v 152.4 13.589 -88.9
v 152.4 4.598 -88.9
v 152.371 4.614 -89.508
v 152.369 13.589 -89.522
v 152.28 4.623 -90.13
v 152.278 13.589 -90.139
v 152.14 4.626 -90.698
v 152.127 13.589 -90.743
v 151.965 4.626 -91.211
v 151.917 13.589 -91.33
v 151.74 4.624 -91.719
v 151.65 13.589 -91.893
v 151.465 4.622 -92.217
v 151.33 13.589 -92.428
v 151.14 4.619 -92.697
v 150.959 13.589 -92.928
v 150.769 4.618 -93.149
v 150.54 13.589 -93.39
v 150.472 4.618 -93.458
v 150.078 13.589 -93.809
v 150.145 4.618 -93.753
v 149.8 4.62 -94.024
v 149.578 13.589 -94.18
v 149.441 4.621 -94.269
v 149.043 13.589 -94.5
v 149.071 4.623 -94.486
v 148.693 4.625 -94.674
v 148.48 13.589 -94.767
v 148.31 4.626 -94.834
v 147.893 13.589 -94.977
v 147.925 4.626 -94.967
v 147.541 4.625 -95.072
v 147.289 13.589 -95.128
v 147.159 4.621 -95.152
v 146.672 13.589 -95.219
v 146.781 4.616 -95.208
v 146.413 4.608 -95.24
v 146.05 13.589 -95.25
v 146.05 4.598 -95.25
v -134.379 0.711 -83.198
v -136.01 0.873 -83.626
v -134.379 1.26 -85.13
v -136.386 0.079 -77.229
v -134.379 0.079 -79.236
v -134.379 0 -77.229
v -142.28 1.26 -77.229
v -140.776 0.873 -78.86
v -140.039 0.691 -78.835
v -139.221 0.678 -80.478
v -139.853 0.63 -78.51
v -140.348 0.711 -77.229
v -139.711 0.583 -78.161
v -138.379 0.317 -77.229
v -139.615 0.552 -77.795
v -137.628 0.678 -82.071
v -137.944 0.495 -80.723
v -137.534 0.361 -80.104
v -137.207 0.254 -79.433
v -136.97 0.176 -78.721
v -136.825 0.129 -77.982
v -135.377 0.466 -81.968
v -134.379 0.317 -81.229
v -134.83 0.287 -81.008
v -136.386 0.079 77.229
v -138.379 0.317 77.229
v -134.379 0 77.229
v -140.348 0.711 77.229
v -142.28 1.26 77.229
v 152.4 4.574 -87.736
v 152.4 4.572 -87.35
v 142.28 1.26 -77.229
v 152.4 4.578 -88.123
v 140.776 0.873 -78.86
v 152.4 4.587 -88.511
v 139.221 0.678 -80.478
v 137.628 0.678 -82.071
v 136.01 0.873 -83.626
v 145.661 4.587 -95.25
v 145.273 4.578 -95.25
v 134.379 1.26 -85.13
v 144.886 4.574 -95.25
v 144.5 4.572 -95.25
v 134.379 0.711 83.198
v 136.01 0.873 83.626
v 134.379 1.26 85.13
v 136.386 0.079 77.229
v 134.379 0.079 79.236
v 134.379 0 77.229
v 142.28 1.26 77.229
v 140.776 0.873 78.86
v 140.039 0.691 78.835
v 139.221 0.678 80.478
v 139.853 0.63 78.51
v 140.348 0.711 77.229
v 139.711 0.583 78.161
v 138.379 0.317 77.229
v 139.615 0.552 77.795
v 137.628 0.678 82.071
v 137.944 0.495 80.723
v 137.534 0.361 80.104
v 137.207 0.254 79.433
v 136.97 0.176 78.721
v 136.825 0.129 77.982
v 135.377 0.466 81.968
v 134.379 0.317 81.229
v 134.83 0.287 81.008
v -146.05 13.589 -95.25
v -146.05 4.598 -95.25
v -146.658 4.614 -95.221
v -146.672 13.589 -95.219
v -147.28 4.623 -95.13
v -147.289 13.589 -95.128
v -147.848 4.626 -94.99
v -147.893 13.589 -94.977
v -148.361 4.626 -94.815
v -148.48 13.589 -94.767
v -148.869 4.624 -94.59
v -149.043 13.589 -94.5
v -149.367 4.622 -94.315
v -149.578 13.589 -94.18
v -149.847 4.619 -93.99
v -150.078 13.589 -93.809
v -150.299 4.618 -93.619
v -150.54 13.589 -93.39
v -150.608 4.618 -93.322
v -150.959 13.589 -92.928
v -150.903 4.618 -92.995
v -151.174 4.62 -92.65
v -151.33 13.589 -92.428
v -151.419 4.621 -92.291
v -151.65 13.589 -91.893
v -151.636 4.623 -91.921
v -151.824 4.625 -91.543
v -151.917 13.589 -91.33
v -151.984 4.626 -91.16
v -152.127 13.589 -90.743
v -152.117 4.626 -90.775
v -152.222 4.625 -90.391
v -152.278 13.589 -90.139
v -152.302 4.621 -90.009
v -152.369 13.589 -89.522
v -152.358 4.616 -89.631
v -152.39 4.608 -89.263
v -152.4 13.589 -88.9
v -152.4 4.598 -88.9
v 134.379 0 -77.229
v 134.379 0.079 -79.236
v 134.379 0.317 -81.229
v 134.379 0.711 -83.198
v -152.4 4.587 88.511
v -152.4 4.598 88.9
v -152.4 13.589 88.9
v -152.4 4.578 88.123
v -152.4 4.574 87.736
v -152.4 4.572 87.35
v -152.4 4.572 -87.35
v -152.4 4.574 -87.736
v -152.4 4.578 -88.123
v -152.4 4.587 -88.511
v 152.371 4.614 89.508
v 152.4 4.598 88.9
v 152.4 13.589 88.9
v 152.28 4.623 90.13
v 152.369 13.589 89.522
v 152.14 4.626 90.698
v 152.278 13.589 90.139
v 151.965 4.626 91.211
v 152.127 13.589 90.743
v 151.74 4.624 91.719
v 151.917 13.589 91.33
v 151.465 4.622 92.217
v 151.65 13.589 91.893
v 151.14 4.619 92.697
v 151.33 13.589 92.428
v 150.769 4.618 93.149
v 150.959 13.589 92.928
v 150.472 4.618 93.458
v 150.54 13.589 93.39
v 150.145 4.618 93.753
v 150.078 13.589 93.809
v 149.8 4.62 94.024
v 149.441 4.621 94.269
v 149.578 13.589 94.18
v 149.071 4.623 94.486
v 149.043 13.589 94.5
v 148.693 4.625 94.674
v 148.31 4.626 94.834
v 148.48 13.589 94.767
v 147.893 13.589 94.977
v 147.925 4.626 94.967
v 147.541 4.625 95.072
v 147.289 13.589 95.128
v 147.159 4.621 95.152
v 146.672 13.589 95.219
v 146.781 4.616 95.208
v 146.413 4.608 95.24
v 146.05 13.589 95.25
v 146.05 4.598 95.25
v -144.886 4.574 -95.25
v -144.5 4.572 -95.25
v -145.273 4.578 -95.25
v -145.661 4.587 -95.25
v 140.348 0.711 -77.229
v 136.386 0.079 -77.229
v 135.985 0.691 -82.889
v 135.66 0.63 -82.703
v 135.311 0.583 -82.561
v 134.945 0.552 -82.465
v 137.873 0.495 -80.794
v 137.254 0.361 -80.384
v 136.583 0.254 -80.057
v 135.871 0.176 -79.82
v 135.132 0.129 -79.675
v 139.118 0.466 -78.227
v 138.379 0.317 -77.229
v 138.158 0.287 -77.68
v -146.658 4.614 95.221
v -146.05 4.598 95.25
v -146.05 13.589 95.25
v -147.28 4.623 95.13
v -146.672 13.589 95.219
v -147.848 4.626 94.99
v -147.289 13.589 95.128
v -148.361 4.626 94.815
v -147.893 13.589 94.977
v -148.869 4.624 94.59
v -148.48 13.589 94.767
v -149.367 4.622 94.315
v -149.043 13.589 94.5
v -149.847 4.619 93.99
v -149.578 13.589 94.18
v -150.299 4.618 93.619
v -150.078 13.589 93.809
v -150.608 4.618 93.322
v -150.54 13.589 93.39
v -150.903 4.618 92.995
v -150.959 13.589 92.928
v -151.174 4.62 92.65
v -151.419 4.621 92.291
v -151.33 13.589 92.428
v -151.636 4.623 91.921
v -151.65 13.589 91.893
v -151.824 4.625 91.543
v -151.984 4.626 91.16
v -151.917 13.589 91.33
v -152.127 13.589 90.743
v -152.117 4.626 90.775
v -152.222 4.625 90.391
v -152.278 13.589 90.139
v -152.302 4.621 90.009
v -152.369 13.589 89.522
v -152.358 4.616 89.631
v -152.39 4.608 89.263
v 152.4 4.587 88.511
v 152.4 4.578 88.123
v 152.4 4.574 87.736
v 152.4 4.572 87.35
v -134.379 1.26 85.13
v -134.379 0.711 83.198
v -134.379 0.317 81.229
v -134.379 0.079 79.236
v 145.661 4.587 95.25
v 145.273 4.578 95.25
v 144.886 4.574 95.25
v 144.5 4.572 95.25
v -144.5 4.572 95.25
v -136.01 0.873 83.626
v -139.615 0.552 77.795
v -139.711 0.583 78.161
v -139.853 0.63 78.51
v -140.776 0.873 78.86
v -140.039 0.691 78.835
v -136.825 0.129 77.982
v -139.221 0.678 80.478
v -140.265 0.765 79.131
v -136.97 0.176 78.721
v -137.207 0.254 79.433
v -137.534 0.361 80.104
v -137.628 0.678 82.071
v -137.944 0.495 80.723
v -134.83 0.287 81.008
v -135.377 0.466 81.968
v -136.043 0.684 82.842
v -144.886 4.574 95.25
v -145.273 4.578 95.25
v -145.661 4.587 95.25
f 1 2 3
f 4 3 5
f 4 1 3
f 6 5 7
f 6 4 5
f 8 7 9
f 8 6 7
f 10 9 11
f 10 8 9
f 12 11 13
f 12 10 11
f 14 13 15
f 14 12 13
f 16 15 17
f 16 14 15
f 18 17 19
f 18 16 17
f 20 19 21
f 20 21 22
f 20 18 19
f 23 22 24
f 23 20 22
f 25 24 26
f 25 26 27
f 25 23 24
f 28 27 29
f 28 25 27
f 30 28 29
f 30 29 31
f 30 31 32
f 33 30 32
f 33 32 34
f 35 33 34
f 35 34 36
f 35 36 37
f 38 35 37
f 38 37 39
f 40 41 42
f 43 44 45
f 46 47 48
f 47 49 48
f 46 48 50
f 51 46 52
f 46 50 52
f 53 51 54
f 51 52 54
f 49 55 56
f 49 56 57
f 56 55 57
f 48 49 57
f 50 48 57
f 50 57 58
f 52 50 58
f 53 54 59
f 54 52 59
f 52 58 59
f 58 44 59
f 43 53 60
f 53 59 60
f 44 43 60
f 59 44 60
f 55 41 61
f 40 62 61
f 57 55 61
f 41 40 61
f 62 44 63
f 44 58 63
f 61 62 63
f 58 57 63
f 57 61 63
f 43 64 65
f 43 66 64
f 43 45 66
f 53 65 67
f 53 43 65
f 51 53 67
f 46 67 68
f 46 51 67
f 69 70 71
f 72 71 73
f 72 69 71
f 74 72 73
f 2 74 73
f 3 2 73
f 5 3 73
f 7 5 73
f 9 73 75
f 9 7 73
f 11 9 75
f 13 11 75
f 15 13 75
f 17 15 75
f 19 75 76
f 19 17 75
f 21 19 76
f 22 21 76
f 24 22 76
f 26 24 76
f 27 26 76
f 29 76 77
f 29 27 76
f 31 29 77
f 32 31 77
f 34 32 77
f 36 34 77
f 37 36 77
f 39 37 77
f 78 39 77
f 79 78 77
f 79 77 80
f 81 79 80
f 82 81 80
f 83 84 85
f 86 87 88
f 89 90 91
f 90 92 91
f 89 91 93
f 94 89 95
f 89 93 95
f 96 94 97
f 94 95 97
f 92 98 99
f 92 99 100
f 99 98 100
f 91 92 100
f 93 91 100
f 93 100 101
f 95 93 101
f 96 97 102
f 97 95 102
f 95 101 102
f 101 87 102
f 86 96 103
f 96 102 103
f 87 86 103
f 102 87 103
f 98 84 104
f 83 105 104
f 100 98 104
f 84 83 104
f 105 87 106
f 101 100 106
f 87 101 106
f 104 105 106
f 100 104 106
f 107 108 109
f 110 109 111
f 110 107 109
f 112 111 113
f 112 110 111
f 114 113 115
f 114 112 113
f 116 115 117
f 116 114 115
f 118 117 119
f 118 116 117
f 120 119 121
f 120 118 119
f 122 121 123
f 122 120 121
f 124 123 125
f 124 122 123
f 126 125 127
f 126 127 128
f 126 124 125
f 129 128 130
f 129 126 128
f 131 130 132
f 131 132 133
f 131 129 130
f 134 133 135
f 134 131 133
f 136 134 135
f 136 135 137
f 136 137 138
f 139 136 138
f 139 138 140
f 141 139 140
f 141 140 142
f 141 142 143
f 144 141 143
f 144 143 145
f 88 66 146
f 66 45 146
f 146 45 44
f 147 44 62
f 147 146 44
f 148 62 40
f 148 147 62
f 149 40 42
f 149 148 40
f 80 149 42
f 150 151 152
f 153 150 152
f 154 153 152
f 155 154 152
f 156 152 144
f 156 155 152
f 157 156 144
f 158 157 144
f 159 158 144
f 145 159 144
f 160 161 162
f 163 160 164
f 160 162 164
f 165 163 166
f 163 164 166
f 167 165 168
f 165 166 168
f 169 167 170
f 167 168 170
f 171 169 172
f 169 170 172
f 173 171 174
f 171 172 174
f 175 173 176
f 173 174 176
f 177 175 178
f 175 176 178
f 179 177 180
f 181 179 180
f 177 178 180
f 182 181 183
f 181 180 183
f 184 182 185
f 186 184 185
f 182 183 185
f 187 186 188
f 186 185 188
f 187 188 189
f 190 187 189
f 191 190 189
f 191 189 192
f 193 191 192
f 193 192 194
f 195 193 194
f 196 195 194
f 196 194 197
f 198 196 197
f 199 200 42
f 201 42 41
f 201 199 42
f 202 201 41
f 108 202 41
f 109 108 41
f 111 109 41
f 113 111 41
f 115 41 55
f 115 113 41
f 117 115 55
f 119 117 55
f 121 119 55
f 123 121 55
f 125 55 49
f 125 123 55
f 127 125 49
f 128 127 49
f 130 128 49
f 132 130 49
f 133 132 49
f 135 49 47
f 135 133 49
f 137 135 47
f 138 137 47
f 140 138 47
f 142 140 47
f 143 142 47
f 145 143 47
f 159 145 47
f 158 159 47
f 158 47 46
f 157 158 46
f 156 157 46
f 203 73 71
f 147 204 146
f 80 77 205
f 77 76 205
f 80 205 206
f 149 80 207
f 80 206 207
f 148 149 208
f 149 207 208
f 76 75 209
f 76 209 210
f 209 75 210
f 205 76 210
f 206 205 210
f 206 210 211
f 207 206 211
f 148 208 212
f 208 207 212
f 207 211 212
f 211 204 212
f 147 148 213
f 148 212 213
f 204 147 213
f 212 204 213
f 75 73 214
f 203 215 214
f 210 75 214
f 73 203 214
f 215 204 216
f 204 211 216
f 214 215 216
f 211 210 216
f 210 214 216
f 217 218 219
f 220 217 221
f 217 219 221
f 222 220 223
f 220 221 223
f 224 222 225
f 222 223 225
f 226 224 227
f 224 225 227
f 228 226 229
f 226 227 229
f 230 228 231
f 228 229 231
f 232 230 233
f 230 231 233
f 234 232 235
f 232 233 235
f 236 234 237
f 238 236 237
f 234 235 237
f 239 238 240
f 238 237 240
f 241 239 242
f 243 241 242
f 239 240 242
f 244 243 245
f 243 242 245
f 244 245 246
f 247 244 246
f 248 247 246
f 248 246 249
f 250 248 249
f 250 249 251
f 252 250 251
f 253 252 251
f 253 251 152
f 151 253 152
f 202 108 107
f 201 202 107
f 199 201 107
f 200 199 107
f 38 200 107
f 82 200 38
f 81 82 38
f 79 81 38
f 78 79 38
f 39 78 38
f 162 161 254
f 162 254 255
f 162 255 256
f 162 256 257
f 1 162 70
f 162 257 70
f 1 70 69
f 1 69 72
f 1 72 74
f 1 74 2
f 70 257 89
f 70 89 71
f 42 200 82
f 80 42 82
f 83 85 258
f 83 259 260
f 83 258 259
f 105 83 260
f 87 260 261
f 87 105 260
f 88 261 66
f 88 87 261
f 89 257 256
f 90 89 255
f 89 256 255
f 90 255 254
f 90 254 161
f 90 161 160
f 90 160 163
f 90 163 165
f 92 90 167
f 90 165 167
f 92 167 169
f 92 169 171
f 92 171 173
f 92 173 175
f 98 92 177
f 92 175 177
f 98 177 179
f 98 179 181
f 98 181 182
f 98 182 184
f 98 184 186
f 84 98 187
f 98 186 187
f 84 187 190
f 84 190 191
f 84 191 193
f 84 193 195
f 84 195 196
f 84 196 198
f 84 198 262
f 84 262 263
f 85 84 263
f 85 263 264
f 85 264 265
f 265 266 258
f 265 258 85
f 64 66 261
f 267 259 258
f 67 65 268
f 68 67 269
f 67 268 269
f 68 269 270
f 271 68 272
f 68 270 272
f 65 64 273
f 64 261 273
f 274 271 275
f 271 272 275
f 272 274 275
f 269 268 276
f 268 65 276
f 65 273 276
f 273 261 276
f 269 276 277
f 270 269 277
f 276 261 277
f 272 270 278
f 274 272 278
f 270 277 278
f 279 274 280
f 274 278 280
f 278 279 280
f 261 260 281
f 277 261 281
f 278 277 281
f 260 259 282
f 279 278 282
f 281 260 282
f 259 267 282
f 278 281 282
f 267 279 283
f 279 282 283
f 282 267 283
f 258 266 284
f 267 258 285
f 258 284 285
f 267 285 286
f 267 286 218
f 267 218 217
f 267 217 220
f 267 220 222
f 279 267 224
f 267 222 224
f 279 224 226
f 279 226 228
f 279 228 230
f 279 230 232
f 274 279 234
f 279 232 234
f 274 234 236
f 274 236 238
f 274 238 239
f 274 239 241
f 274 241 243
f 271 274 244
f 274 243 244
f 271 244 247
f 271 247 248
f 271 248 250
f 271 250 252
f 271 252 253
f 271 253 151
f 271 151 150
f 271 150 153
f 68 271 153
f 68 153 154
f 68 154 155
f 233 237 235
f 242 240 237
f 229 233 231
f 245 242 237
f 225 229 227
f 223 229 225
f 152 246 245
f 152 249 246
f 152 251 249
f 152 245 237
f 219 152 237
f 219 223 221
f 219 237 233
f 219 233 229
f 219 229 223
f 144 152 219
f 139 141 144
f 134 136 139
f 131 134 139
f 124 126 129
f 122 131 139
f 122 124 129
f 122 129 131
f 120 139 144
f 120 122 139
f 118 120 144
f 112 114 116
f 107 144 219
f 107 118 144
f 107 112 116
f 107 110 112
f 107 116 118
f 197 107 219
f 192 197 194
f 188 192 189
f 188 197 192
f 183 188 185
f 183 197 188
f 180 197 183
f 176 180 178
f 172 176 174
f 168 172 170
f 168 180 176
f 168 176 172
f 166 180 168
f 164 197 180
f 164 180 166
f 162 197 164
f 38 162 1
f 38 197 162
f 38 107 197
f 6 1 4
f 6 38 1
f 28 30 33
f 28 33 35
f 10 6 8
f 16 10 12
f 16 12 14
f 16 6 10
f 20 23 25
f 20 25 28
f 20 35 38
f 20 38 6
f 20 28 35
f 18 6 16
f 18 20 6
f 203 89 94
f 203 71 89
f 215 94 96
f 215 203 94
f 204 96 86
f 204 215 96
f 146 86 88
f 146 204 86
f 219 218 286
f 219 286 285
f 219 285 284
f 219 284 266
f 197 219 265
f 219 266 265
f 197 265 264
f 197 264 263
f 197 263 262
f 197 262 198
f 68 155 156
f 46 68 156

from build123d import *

# Parameters (mm, degrees)
SKETCH1_W           = 304.8
SKETCH1_H           = 190.5
BOSS_EXTRUDE1_DEPTH = 13.589
CHAMFER1_SIZE       = 13.97
CHAMFER1_SIZE2      = 4.572
CHAMFER2_SIZE       = 13.97
CHAMFER2_SIZE2      = 4.572
CHAMFER3_SIZE       = 13.97
CHAMFER3_SIZE2      = 4.572
CHAMFER4_SIZE       = 13.97
CHAMFER4_SIZE2      = 4.572
FILLET1_R           = 6.35
FILLET3_R           = 25.4


with BuildPart() as part:
    # Sketch1 → Boss-Extrude1 (new body)
    with BuildSketch(Plane(origin=(0, 0, 0), x_dir=(1, 0, 0), z_dir=(0, 1, 0))):
        Rectangle(SKETCH1_W, SKETCH1_H)
    extrude(amount=BOSS_EXTRUDE1_DEPTH)

    # Chamfer1
    chamfer1_edges = [part.edges().sort_by_distance(p)[0] for p in [
        (-152.4, 0, 0),
    ]]
    chamfer1_side = [part.faces().sort_by_distance(p)[0] for p in [
        (0, 0, 0),
    ]]
    chamfer(chamfer1_edges, length=CHAMFER1_SIZE, length2=CHAMFER1_SIZE2, reference=chamfer1_side[0])

    # Chamfer2
    chamfer2_edges = [part.edges().sort_by_distance(p)[0] for p in [
        (6.985, 0, -95.25),
    ]]
    chamfer2_side = [part.faces().sort_by_distance(p)[0] for p in [
        (6.985, 0, 0),
    ]]
    chamfer(chamfer2_edges, length=CHAMFER2_SIZE, length2=CHAMFER2_SIZE2, reference=chamfer2_side[0])

    # Chamfer3
    chamfer3_edges = [part.edges().sort_by_distance(p)[0] for p in [
        (152.4, 0, 6.985),
    ]]
    chamfer3_side = [part.faces().sort_by_distance(p)[0] for p in [
        (6.985, 0, 6.985),
    ]]
    chamfer(chamfer3_edges, length=CHAMFER3_SIZE, length2=CHAMFER3_SIZE2, reference=chamfer3_side[0])

    # Chamfer4
    chamfer4_edges = [part.edges().sort_by_distance(p)[0] for p in [
        (0, 0, 95.25),
    ]]
    chamfer4_side = [part.faces().sort_by_distance(p)[0] for p in [
        (0, 0, 6.985),
    ]]
    chamfer(chamfer4_edges, length=CHAMFER4_SIZE, length2=CHAMFER4_SIZE2, reference=chamfer4_side[0])

    # Fillet1
    fillet1_edges = [part.edges().sort_by_distance(p)[0] for p in [
        (152.4, 9.0805, 95.25),
        (-152.4, 9.0805, 95.25),
        (-152.4, 9.0805, -95.25),
        (152.4, 9.0805, -95.25),
    ]]
    fillet(fillet1_edges, radius=FILLET1_R)

    # Fillet3
    fillet3_edges = [part.edges().sort_by_distance(p)[0] for p in [
        (0, 0, 81.28),
        (144.48506403, 1.981657319, 87.33506403),
        (138.43, 0, 0),
        (144.48506403, 1.981657319, -87.33506403),
        (0, 0, -81.28),
        (-144.48506403, 1.981657319, -87.33506403),
        (-138.43, 0, 0),
        (-144.48506403, 1.981657319, 87.33506403),
    ]]
    fillet(fillet3_edges, radius=FILLET3_R)


solid = part.part
